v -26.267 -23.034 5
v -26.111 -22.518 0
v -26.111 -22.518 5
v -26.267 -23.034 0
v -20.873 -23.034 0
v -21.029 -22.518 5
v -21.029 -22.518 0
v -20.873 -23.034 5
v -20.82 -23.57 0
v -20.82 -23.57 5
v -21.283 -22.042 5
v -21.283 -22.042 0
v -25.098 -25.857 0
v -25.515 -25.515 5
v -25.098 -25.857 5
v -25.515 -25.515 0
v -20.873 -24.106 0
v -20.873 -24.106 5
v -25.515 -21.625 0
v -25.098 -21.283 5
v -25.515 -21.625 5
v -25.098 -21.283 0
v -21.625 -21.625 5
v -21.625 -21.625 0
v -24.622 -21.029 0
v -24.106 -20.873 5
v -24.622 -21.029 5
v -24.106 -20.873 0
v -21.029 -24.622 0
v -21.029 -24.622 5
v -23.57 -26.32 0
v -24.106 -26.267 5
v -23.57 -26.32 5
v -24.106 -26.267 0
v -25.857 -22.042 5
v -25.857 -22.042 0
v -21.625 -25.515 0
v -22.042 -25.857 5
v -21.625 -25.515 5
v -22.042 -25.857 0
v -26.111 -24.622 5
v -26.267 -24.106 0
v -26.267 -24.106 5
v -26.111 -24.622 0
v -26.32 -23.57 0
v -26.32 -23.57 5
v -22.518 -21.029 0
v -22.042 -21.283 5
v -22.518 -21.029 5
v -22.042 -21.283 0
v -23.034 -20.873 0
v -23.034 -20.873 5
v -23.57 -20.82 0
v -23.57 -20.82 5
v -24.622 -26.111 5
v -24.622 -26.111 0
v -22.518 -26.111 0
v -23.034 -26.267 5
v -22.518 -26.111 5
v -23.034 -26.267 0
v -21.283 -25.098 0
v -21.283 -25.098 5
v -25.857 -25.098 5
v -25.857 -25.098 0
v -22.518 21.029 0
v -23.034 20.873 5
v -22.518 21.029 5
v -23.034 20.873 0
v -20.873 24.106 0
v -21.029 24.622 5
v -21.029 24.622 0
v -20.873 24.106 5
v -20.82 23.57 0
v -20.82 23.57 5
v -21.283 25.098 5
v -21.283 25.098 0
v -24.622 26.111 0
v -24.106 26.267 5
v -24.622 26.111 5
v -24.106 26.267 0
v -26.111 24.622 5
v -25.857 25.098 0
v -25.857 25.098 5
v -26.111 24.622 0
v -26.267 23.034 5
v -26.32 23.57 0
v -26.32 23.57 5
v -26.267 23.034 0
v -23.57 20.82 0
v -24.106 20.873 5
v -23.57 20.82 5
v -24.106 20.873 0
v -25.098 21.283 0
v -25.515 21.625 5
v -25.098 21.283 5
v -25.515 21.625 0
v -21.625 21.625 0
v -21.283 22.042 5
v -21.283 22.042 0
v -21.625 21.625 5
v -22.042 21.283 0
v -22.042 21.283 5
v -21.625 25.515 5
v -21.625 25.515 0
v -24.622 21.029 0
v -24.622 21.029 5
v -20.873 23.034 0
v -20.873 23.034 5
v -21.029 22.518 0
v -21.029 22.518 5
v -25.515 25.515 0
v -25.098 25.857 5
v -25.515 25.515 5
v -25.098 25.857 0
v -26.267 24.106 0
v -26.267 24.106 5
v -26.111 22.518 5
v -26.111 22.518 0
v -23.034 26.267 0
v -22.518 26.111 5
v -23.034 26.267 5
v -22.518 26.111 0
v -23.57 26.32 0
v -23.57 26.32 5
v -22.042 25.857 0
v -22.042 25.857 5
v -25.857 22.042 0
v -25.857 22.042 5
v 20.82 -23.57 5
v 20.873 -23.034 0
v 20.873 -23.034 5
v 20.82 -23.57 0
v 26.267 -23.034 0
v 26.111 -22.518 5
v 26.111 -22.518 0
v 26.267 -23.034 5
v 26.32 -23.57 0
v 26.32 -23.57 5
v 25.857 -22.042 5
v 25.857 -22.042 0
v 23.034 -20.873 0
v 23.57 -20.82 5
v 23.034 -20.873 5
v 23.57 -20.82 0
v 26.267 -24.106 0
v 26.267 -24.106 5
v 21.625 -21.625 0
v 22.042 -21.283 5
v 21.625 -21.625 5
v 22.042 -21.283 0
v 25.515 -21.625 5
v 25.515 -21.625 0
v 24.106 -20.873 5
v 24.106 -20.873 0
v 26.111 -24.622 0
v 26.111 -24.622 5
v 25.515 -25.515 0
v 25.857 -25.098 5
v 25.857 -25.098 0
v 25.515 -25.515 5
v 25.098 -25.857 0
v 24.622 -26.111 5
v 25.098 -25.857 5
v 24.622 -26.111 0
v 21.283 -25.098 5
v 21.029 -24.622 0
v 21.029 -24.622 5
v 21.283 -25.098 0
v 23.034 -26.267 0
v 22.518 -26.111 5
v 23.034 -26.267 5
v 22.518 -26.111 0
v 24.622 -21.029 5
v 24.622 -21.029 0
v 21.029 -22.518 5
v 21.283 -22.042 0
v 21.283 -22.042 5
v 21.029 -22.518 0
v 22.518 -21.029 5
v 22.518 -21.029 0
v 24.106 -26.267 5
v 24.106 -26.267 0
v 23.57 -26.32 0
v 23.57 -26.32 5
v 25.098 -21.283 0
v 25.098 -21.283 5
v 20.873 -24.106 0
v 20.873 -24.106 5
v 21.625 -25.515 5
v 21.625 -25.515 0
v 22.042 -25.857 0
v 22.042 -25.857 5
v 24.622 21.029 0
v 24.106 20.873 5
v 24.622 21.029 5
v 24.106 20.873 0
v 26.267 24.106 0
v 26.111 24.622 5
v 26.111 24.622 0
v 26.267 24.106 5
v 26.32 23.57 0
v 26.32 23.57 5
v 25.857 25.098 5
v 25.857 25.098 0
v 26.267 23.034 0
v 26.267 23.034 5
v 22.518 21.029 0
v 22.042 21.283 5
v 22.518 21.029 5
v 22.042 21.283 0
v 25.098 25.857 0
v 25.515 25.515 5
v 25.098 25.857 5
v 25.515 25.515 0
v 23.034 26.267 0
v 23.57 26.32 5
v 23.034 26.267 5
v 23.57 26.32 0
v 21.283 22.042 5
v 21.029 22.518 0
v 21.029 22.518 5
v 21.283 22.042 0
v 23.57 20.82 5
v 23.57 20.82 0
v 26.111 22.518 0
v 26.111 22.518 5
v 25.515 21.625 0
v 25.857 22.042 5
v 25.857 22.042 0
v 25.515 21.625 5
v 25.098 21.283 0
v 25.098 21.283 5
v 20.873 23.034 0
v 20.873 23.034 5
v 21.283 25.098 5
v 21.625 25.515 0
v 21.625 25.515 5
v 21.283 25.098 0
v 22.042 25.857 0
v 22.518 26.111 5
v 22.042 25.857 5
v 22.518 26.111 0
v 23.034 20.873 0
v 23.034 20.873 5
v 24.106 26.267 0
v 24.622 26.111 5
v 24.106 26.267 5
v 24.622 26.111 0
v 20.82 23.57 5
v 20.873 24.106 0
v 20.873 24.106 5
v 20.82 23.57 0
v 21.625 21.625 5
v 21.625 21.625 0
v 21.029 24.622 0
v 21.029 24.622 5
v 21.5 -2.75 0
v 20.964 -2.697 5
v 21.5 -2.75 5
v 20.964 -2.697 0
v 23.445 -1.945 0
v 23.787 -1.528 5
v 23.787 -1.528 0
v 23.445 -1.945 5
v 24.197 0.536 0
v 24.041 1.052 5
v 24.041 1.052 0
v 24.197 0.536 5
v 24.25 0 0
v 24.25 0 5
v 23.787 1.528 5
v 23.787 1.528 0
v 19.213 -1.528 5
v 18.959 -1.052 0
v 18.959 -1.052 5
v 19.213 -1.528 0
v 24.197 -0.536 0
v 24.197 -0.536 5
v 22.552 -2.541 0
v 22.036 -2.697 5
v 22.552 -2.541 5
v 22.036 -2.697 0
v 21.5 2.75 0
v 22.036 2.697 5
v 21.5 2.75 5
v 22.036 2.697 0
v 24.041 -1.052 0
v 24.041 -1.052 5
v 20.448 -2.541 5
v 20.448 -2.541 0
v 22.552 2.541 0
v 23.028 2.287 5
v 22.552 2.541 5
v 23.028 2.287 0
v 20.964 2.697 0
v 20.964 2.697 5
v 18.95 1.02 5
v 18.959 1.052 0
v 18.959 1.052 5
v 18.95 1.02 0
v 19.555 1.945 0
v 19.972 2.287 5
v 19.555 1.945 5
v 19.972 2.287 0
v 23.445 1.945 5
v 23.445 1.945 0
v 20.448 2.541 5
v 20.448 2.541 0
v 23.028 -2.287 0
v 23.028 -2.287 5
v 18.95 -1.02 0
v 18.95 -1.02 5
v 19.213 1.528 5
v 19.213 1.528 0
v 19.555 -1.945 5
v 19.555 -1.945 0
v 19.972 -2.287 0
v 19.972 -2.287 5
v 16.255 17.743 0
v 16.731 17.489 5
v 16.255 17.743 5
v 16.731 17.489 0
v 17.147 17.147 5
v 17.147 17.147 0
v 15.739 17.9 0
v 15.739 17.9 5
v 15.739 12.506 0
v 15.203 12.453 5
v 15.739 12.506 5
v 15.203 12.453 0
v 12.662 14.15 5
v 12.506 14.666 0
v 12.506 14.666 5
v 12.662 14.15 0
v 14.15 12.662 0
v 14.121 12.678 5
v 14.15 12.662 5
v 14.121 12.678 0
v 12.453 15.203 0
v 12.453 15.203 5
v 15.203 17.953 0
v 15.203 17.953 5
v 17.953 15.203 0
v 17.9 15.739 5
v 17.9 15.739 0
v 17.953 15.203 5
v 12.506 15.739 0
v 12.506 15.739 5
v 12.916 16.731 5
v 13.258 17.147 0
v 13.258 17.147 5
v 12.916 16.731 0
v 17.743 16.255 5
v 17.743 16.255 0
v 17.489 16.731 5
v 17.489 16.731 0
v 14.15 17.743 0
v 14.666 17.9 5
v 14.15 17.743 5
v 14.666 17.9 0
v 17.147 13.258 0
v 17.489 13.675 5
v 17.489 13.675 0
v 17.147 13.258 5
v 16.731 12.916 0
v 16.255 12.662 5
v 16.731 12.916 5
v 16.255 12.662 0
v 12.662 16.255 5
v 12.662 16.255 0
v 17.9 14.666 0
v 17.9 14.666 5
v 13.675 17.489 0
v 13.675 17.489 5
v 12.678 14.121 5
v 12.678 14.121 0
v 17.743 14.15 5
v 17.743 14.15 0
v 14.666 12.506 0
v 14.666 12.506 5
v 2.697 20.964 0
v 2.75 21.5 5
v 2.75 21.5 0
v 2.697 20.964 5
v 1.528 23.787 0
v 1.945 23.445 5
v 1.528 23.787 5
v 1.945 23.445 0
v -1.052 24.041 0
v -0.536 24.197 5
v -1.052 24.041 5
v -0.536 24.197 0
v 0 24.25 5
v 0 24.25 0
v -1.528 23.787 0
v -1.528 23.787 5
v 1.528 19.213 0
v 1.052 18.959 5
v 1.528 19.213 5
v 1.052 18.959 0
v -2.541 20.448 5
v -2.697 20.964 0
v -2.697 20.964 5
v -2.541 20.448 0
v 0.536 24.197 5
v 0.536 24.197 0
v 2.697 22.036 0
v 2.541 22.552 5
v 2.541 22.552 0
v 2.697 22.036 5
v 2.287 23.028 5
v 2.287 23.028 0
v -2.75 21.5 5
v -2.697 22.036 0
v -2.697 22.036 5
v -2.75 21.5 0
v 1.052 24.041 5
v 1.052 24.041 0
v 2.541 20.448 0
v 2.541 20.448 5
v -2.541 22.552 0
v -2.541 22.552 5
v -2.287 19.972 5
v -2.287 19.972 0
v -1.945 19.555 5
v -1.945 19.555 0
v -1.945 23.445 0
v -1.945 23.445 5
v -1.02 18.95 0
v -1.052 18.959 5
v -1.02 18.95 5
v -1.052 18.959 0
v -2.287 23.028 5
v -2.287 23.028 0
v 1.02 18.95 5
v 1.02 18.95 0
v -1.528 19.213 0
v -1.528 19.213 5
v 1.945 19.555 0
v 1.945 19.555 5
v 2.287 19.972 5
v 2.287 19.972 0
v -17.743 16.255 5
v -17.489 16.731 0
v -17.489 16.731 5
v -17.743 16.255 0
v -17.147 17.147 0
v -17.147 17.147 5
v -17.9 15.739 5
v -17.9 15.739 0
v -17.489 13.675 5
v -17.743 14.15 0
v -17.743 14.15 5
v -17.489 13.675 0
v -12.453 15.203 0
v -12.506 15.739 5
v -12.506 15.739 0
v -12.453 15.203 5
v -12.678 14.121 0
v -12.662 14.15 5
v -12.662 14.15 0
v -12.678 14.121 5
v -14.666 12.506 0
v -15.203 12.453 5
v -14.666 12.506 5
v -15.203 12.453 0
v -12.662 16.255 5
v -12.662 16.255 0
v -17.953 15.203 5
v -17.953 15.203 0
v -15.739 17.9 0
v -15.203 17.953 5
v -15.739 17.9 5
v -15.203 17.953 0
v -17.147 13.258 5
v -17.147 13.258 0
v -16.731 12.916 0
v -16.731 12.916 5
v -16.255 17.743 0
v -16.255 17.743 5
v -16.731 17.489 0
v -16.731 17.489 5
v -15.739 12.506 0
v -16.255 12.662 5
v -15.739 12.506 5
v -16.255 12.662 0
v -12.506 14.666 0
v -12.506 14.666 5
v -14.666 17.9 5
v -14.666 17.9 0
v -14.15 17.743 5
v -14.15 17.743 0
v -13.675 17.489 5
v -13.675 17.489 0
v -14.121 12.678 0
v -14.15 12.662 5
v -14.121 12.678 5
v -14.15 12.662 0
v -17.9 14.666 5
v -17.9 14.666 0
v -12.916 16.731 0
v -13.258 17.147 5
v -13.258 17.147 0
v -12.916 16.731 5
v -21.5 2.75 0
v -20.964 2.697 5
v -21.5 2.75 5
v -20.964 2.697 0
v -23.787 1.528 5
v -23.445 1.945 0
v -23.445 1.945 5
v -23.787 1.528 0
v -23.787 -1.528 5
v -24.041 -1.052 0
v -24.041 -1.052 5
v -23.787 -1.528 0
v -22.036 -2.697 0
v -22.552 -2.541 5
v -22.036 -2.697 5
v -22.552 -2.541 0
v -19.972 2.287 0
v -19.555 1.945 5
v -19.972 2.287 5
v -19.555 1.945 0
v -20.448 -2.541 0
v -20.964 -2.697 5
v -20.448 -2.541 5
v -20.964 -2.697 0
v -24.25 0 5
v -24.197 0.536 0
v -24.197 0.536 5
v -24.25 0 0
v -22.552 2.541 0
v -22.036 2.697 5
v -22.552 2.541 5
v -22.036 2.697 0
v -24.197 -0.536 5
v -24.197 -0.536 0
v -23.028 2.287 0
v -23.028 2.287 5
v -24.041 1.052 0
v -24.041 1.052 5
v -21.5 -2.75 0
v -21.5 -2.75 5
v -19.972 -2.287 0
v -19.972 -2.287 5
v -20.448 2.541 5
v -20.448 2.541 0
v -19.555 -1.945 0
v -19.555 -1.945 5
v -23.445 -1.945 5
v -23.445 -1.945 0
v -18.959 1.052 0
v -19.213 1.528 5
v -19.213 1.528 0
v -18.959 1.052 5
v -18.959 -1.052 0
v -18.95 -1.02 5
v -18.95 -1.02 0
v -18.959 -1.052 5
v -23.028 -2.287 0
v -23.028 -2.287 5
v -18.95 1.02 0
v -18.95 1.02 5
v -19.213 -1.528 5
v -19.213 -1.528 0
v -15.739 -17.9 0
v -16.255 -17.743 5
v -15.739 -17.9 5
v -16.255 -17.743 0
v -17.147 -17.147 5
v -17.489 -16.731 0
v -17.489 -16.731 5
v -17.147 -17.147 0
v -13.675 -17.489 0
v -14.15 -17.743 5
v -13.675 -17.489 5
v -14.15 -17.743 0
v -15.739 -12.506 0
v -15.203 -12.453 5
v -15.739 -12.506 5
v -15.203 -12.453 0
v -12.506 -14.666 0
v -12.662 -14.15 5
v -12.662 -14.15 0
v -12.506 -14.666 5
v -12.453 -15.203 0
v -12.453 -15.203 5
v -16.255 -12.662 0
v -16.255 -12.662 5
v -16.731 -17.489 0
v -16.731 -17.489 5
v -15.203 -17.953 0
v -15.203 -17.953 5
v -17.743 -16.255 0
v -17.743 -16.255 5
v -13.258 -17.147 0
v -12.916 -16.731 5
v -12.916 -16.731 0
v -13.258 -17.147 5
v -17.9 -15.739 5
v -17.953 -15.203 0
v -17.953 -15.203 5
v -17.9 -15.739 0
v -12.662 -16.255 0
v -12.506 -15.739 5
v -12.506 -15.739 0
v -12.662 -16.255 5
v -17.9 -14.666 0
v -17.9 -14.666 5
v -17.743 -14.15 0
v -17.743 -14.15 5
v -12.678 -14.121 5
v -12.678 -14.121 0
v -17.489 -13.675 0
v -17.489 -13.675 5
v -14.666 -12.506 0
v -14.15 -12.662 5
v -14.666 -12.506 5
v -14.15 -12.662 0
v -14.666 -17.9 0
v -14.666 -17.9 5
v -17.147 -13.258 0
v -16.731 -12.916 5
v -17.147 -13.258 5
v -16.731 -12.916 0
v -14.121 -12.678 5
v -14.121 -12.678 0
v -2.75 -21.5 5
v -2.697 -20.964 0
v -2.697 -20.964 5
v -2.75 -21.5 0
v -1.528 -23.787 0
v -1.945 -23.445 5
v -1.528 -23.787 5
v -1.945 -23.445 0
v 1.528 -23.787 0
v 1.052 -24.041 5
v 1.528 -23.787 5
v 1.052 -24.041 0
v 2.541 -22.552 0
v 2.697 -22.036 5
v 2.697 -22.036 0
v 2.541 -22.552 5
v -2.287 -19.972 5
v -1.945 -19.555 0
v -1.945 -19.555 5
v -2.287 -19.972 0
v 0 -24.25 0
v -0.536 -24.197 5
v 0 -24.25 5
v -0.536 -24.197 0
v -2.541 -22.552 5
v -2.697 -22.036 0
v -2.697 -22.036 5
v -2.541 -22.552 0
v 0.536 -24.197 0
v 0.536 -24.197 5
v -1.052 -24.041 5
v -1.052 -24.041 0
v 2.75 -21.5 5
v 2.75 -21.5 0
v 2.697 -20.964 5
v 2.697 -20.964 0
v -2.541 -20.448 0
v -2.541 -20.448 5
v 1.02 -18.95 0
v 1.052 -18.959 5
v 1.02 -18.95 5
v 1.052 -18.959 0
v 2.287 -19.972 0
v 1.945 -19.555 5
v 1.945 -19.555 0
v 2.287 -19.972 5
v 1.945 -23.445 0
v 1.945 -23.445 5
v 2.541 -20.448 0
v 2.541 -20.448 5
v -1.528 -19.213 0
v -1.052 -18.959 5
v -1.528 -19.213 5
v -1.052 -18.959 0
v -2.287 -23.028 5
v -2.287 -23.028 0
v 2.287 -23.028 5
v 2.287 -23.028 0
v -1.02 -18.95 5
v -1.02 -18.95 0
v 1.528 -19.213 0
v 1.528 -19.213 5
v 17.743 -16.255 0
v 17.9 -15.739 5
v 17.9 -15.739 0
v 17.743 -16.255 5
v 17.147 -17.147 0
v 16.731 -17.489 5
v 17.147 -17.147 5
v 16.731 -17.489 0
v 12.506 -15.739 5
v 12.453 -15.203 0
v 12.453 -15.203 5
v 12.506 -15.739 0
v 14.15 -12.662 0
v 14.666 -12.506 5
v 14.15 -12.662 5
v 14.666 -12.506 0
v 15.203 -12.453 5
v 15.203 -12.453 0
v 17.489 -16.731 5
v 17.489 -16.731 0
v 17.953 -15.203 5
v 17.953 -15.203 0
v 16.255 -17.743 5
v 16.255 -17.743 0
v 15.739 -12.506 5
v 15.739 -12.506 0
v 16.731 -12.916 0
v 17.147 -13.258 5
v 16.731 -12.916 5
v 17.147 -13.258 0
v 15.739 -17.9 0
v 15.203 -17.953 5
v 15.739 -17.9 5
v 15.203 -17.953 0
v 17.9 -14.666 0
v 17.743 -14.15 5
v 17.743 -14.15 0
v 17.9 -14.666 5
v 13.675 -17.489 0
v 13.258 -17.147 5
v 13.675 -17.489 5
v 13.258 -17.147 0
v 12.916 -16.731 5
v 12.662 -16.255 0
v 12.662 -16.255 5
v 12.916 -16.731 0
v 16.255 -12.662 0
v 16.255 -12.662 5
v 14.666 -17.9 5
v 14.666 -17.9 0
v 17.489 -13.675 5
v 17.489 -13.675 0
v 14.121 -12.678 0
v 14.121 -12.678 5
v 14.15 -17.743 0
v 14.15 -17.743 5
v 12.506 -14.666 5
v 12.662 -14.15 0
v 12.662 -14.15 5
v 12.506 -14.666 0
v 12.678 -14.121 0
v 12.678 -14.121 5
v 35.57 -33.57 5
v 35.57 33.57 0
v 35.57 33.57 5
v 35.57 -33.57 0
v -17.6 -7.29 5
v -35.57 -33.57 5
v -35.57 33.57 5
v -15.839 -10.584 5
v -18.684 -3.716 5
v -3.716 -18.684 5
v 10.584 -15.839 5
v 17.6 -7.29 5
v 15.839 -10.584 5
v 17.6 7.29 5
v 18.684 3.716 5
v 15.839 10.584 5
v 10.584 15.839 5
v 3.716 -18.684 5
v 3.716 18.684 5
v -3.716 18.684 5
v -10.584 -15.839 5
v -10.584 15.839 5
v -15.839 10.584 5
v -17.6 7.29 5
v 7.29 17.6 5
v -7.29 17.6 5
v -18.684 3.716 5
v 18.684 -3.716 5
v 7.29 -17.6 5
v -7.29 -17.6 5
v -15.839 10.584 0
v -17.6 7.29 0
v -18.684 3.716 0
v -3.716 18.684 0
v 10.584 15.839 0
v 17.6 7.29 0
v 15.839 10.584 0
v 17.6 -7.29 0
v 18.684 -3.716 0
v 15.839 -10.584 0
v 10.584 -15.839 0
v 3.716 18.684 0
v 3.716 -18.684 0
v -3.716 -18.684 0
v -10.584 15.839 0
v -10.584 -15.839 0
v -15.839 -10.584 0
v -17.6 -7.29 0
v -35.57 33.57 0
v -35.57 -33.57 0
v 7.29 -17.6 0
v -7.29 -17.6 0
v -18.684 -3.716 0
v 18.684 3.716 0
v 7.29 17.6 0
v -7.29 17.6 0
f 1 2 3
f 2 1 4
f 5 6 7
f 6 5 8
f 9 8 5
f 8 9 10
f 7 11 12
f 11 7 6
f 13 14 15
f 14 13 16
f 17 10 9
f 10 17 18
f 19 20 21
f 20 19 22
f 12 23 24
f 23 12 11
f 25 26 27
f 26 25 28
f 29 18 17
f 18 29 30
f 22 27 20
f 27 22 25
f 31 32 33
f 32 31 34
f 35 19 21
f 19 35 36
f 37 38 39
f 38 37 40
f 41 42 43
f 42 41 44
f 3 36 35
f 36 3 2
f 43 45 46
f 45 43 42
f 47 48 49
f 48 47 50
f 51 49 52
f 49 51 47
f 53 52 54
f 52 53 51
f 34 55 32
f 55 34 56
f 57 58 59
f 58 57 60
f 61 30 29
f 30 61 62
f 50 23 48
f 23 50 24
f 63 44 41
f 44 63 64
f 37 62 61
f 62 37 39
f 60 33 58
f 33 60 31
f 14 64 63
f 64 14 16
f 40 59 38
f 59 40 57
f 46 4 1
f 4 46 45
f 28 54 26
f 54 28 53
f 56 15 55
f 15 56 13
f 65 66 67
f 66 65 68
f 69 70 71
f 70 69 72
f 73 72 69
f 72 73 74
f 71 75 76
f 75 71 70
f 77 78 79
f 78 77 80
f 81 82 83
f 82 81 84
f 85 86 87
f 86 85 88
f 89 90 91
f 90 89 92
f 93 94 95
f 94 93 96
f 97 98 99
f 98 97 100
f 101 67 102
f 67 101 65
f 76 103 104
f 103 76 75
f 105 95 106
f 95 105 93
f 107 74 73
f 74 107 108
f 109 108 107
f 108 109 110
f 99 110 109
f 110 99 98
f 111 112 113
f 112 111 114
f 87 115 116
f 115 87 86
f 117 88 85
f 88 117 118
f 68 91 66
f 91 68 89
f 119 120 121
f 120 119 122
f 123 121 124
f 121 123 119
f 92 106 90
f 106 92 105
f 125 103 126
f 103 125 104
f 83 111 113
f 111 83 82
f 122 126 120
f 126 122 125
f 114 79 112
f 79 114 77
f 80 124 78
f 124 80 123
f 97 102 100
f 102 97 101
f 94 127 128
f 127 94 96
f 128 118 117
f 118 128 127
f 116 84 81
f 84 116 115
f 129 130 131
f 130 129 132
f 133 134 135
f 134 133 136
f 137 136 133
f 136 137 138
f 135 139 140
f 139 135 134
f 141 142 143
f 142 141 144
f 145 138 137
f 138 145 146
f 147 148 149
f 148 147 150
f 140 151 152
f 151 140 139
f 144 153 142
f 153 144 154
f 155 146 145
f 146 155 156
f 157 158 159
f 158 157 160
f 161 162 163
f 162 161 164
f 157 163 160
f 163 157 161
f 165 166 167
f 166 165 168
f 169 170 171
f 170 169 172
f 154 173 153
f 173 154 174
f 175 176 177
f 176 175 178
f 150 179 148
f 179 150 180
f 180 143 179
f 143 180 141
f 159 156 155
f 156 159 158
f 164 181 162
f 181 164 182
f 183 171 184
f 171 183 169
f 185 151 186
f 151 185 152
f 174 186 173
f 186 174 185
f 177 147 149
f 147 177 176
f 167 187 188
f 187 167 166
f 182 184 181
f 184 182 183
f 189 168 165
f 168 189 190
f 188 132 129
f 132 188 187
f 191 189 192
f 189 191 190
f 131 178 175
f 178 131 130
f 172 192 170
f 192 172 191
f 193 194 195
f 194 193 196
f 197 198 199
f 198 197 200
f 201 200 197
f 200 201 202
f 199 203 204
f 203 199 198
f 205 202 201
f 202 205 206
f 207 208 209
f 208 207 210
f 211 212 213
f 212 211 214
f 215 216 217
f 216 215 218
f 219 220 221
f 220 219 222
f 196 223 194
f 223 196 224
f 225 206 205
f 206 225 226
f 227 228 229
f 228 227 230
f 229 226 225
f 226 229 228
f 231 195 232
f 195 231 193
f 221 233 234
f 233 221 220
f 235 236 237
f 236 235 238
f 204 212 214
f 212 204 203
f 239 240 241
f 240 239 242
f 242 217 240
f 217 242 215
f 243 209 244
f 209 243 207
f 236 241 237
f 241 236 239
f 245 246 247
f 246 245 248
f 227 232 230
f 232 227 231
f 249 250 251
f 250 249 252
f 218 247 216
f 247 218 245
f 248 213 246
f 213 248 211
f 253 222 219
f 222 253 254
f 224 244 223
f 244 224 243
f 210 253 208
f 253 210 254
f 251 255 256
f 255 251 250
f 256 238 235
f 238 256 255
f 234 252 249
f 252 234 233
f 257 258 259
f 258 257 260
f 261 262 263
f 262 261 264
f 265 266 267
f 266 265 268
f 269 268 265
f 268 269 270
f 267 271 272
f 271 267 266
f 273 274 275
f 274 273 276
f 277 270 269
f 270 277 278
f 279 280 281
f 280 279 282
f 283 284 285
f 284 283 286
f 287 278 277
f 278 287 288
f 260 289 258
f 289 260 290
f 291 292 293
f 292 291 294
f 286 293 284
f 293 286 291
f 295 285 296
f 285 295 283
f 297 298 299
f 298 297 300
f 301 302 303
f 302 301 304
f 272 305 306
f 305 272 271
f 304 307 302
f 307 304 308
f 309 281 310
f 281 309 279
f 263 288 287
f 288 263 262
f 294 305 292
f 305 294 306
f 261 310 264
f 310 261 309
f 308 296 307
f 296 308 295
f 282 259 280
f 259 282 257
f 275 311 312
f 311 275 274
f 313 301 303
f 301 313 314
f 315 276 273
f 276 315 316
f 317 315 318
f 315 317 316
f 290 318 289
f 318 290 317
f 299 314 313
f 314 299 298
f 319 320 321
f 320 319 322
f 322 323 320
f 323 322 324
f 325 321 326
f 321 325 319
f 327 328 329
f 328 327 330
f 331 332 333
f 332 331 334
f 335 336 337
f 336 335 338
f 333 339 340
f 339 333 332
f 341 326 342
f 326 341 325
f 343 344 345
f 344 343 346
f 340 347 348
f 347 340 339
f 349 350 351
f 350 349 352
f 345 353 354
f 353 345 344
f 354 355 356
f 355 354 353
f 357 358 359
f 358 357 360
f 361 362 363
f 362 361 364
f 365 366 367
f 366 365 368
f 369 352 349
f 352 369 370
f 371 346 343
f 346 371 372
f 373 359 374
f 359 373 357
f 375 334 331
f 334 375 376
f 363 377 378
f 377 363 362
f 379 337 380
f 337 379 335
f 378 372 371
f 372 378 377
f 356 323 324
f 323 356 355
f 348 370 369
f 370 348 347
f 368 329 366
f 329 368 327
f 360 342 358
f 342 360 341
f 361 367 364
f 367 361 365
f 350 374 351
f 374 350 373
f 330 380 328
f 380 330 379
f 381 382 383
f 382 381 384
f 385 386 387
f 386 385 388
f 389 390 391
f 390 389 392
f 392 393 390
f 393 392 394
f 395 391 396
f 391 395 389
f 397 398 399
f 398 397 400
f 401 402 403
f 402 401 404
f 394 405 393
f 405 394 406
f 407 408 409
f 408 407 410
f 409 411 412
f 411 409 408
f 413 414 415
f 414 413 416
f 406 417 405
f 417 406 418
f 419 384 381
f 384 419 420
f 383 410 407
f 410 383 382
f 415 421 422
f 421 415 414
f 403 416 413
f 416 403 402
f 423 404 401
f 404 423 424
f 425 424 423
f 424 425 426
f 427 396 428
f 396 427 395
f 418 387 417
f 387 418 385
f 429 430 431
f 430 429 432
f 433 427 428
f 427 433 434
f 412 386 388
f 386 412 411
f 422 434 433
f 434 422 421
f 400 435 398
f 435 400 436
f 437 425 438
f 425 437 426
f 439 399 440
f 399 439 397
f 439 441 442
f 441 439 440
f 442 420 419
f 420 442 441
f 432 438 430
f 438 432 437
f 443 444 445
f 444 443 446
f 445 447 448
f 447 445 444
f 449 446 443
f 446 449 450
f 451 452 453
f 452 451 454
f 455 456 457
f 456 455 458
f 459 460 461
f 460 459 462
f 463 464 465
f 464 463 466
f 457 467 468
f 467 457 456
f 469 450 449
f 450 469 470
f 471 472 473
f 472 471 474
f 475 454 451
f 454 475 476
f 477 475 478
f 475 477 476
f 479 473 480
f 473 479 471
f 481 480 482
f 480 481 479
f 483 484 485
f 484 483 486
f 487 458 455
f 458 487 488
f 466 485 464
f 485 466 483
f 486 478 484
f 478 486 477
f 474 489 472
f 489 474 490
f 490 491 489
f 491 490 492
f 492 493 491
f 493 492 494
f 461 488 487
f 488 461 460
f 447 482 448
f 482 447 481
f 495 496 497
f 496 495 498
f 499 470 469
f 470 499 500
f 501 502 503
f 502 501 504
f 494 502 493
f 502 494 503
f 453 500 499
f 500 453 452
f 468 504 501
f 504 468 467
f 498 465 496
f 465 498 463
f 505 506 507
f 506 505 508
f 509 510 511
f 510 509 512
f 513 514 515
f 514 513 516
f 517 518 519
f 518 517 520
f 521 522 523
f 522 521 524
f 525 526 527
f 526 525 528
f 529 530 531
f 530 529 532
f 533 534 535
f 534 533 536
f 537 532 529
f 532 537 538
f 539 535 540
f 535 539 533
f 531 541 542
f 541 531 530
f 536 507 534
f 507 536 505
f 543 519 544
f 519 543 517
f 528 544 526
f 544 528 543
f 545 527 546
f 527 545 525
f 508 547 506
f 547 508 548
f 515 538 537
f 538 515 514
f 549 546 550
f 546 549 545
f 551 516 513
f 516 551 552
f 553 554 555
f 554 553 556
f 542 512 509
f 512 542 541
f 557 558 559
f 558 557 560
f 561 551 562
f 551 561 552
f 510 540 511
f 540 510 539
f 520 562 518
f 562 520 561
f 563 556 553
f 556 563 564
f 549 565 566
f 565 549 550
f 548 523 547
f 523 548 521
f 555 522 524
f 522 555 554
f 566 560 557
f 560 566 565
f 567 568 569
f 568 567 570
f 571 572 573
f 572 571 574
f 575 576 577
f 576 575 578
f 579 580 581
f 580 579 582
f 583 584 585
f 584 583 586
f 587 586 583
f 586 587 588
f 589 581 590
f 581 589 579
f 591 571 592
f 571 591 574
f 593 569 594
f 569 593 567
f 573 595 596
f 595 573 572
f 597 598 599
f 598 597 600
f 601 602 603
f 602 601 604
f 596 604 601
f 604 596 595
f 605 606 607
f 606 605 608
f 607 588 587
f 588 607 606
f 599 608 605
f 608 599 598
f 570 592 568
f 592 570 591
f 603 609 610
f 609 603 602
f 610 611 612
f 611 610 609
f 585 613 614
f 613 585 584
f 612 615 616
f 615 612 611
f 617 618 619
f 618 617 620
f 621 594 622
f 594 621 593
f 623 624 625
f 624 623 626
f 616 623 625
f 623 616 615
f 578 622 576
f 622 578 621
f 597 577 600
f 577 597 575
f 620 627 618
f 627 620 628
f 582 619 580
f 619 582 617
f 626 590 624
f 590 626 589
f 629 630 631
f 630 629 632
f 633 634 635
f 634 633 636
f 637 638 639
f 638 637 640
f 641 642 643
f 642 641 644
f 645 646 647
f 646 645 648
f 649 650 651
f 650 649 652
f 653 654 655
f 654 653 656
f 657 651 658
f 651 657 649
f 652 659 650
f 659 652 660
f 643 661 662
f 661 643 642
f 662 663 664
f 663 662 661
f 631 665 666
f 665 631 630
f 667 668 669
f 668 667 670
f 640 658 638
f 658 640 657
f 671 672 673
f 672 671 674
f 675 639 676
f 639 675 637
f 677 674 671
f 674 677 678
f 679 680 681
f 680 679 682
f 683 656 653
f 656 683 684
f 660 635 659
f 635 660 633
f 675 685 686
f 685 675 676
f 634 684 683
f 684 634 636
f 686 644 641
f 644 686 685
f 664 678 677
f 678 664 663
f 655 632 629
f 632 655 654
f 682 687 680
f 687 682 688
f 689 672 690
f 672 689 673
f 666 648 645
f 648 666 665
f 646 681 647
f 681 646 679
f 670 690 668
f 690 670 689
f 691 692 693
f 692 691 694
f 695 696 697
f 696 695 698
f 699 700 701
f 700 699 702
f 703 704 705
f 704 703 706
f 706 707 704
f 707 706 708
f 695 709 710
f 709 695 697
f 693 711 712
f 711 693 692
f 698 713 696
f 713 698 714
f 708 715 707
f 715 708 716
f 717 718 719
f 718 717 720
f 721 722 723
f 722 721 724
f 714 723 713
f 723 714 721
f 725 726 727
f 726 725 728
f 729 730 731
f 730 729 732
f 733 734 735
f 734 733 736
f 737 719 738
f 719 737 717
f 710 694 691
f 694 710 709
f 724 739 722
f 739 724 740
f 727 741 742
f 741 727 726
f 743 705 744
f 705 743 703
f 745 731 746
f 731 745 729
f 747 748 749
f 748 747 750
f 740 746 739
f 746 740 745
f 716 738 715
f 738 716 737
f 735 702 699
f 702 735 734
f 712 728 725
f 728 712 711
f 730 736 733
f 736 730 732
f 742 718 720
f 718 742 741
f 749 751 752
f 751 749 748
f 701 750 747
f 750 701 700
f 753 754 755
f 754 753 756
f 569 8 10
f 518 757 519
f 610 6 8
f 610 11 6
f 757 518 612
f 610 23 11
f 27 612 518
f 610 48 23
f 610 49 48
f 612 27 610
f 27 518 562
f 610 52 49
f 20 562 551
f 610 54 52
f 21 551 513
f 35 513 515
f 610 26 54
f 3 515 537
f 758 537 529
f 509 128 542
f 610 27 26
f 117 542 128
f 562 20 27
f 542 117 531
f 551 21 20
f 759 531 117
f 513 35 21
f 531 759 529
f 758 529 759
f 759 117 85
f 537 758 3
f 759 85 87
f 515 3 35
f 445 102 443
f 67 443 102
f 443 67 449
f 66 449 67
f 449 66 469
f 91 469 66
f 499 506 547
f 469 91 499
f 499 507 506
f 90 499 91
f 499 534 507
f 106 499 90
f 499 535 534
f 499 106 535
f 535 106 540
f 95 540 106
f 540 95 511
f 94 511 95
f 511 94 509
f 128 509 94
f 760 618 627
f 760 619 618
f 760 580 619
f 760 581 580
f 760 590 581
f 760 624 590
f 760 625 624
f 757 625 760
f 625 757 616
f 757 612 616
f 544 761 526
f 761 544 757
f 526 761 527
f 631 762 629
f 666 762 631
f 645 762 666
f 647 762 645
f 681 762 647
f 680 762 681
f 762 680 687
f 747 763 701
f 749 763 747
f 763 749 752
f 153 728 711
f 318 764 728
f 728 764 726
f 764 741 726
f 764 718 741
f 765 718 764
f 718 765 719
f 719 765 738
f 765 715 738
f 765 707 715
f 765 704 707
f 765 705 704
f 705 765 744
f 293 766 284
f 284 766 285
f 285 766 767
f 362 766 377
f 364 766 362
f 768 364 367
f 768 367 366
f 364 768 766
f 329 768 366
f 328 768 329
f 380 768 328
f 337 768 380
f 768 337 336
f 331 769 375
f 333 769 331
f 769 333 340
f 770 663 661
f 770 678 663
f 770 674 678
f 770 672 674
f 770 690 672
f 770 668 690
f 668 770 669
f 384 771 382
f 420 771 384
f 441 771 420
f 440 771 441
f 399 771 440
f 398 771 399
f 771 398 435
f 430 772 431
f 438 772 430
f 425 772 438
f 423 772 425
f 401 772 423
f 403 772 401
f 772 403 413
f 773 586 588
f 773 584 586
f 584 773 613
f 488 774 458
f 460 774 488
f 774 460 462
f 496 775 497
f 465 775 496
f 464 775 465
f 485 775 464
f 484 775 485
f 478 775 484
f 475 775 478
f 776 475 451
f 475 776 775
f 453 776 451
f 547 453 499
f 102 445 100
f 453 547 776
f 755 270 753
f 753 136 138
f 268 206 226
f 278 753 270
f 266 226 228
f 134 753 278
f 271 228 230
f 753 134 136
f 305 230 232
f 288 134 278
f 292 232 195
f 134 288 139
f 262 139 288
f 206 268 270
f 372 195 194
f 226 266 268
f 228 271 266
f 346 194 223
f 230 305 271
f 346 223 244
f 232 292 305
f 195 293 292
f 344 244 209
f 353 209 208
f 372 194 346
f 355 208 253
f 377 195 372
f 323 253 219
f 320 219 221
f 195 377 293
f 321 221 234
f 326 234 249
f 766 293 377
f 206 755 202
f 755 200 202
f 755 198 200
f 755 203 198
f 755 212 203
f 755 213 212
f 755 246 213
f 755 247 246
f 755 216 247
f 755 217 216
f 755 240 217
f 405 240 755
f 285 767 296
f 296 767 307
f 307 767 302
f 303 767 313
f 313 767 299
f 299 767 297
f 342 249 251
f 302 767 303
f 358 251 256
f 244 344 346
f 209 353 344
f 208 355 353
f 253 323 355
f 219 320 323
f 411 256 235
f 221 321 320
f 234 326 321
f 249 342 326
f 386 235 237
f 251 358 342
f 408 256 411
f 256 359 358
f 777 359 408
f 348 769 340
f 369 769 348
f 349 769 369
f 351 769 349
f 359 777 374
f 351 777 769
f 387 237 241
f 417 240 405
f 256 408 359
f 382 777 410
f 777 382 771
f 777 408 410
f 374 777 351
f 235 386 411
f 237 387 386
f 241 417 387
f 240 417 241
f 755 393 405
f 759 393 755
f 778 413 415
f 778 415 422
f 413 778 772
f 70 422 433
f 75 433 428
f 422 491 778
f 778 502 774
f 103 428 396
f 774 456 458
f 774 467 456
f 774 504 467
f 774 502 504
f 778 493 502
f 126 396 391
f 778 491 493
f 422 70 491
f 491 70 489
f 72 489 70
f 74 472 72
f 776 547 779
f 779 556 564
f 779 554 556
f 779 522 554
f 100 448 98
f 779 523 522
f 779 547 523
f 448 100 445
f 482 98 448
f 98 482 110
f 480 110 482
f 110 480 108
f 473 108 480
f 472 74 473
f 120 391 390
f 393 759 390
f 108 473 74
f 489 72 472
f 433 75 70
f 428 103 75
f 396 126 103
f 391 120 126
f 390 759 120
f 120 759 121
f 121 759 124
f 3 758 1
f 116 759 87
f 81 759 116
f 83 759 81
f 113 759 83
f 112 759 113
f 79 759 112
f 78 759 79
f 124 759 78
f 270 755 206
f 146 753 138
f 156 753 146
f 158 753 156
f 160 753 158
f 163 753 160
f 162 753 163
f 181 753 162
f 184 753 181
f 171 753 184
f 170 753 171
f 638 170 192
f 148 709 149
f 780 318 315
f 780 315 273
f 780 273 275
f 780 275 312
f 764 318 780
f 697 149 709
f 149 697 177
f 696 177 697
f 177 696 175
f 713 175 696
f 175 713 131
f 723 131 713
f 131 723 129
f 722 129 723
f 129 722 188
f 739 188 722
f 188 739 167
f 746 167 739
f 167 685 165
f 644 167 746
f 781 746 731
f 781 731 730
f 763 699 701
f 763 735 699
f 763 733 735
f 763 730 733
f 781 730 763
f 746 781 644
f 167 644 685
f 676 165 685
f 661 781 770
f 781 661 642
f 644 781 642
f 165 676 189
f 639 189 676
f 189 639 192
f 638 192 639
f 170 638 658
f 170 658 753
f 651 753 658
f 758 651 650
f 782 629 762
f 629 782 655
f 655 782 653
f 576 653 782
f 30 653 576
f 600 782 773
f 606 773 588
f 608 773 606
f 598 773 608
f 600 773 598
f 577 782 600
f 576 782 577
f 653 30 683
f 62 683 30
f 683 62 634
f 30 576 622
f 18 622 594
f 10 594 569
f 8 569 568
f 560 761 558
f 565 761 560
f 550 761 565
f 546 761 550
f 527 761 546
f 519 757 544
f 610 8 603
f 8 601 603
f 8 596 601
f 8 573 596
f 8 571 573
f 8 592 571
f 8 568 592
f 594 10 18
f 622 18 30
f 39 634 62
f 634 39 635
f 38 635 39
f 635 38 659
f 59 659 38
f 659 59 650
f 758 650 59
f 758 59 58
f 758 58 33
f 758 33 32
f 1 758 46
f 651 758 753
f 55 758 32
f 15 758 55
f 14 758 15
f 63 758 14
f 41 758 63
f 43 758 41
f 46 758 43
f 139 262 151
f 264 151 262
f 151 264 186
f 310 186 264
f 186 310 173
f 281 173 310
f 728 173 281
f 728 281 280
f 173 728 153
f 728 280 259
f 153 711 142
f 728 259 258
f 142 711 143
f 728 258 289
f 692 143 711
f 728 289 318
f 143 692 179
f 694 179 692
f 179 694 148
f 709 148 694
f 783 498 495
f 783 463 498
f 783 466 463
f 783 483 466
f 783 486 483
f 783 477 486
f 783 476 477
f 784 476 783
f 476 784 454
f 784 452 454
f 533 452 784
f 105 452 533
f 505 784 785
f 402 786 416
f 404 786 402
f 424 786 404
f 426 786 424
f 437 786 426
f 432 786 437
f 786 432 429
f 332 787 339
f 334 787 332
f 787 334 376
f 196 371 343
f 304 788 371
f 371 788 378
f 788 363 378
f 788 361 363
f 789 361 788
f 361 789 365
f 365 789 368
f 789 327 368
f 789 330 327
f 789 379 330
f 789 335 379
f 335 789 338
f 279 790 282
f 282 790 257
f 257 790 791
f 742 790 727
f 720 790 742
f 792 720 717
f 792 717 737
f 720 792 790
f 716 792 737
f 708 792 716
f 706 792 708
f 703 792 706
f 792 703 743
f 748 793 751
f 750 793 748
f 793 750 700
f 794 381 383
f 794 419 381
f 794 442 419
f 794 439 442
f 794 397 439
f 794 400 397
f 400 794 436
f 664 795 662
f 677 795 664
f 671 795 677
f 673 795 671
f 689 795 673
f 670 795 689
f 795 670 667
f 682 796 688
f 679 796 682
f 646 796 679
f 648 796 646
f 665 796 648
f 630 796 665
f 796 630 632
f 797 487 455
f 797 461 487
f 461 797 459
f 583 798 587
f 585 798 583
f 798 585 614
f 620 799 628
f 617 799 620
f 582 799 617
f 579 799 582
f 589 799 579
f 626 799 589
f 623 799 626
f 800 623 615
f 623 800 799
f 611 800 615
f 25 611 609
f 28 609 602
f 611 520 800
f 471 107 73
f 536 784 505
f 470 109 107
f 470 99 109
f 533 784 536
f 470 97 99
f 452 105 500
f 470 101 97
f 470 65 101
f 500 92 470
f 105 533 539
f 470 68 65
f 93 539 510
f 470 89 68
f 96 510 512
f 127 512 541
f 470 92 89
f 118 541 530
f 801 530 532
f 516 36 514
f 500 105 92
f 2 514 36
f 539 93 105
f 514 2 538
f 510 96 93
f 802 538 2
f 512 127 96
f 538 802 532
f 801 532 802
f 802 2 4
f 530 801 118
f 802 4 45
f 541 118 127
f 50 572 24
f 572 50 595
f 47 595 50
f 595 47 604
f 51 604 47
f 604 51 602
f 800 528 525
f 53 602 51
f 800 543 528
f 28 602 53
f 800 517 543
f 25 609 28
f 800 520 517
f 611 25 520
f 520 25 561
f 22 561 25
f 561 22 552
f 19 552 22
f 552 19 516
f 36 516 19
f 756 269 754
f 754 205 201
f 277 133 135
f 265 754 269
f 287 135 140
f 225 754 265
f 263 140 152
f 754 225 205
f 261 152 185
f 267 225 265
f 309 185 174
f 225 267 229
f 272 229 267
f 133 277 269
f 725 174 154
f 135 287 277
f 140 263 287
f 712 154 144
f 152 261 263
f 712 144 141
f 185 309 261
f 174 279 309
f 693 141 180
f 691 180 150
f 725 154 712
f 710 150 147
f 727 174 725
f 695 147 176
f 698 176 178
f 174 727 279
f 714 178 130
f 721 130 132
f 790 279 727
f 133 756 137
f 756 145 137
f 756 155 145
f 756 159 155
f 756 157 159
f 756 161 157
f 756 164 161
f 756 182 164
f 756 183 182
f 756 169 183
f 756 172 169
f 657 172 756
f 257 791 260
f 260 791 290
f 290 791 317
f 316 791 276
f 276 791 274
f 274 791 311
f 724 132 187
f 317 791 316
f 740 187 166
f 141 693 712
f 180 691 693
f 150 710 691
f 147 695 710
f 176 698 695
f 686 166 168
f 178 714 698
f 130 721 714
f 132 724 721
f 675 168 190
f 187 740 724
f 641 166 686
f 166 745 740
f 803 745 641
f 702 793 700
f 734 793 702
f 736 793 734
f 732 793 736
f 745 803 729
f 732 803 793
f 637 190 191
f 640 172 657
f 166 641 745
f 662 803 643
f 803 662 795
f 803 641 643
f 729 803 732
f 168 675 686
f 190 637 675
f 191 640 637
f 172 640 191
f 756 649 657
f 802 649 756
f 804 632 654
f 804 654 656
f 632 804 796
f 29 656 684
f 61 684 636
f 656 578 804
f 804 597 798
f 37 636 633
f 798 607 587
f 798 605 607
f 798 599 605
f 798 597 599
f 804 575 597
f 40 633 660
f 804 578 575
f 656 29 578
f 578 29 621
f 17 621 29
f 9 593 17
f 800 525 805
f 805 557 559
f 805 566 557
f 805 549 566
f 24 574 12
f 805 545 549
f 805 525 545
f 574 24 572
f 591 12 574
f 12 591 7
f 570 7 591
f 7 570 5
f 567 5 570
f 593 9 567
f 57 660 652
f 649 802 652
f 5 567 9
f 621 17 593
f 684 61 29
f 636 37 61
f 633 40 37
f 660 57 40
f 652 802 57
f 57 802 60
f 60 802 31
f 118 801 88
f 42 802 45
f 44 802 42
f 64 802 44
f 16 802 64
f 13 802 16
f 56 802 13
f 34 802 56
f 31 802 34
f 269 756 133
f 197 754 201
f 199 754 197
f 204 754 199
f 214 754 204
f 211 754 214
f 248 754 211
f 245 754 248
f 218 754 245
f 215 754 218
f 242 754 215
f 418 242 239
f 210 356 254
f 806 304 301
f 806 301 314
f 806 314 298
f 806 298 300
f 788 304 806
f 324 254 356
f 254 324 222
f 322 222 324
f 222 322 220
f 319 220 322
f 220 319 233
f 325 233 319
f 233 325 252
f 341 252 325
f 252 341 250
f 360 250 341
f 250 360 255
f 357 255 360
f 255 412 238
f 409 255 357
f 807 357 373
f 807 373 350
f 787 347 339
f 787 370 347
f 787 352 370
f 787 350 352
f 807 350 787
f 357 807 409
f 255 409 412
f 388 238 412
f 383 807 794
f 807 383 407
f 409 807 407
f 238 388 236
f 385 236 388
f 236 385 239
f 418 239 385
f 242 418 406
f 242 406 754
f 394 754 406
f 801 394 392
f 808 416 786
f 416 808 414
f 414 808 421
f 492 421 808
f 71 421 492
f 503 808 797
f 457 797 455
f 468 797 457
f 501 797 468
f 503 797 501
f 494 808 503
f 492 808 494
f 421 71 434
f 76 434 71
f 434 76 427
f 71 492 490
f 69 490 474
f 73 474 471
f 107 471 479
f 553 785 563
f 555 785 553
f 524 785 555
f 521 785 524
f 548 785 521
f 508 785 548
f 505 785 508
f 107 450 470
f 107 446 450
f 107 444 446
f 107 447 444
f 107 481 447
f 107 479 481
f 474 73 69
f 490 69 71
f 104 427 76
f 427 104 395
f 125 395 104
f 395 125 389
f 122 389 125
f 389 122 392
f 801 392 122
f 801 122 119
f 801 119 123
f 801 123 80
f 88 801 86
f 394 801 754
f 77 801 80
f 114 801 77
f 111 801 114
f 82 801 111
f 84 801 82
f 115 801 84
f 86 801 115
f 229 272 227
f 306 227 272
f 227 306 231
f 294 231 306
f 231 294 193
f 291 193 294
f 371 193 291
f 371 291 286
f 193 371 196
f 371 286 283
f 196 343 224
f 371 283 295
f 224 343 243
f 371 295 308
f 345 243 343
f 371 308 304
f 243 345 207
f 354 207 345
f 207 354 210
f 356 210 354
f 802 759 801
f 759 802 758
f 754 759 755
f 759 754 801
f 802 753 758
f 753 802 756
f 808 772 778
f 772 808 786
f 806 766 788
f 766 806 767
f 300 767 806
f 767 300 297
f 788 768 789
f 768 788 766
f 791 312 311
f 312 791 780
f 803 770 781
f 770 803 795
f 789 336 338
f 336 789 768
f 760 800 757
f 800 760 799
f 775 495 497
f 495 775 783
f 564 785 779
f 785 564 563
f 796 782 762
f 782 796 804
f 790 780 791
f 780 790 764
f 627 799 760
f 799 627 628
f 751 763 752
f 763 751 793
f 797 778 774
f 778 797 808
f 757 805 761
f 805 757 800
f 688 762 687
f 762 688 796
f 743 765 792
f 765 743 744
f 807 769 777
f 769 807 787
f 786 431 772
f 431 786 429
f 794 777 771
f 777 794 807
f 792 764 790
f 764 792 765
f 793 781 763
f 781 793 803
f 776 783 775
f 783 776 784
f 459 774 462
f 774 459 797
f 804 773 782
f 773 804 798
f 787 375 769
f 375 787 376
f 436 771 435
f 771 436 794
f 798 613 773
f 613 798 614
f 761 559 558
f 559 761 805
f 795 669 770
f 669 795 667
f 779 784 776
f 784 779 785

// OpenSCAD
$fn = 32;

// ----------------------------------------------------------------------
// Motor mount plate: NEMA23, 71.14 x 67.14 x 5 mm
// ----------------------------------------------------------------------

// --- parameters (mm) ---
base_x = 71.14;           // plate length, X
base_y = 67.14;           // plate width, Y
thick = 5;                // plate thickness
bolt_pitch = 47.14;       // NEMA23 bolt spacing
motor_d = 5.5;            // NEMA23 screw clearance
boss_hole = 38.1;         // pilot boss bore
second_d = 5.5;           // second fastener hole
bc_r = 21.5;              // second bolt circle radius
bc_n = 8;                 // second bolt circle count

module plate() {
  translate([-base_x / 2, -base_y / 2, 0]) cube([base_x, base_y, thick]);
}

module motor_holes() {
  for (sx = [-1, 1]) for (sy = [-1, 1])
    translate([sx * bolt_pitch / 2, sy * bolt_pitch / 2, -1])
      cylinder(h = thick + 2, d = motor_d);
}

difference() {
  union() {
    plate();
  }
  motor_holes();
  translate([0, 0, -1]) cylinder(h = thick + 2, d = boss_hole);
  for (i = [0 : bc_n - 1]) rotate([0, 0, i * 360 / bc_n]) translate([bc_r, 0, -1])    cylinder(h = thick + 2, d = second_d);
}
